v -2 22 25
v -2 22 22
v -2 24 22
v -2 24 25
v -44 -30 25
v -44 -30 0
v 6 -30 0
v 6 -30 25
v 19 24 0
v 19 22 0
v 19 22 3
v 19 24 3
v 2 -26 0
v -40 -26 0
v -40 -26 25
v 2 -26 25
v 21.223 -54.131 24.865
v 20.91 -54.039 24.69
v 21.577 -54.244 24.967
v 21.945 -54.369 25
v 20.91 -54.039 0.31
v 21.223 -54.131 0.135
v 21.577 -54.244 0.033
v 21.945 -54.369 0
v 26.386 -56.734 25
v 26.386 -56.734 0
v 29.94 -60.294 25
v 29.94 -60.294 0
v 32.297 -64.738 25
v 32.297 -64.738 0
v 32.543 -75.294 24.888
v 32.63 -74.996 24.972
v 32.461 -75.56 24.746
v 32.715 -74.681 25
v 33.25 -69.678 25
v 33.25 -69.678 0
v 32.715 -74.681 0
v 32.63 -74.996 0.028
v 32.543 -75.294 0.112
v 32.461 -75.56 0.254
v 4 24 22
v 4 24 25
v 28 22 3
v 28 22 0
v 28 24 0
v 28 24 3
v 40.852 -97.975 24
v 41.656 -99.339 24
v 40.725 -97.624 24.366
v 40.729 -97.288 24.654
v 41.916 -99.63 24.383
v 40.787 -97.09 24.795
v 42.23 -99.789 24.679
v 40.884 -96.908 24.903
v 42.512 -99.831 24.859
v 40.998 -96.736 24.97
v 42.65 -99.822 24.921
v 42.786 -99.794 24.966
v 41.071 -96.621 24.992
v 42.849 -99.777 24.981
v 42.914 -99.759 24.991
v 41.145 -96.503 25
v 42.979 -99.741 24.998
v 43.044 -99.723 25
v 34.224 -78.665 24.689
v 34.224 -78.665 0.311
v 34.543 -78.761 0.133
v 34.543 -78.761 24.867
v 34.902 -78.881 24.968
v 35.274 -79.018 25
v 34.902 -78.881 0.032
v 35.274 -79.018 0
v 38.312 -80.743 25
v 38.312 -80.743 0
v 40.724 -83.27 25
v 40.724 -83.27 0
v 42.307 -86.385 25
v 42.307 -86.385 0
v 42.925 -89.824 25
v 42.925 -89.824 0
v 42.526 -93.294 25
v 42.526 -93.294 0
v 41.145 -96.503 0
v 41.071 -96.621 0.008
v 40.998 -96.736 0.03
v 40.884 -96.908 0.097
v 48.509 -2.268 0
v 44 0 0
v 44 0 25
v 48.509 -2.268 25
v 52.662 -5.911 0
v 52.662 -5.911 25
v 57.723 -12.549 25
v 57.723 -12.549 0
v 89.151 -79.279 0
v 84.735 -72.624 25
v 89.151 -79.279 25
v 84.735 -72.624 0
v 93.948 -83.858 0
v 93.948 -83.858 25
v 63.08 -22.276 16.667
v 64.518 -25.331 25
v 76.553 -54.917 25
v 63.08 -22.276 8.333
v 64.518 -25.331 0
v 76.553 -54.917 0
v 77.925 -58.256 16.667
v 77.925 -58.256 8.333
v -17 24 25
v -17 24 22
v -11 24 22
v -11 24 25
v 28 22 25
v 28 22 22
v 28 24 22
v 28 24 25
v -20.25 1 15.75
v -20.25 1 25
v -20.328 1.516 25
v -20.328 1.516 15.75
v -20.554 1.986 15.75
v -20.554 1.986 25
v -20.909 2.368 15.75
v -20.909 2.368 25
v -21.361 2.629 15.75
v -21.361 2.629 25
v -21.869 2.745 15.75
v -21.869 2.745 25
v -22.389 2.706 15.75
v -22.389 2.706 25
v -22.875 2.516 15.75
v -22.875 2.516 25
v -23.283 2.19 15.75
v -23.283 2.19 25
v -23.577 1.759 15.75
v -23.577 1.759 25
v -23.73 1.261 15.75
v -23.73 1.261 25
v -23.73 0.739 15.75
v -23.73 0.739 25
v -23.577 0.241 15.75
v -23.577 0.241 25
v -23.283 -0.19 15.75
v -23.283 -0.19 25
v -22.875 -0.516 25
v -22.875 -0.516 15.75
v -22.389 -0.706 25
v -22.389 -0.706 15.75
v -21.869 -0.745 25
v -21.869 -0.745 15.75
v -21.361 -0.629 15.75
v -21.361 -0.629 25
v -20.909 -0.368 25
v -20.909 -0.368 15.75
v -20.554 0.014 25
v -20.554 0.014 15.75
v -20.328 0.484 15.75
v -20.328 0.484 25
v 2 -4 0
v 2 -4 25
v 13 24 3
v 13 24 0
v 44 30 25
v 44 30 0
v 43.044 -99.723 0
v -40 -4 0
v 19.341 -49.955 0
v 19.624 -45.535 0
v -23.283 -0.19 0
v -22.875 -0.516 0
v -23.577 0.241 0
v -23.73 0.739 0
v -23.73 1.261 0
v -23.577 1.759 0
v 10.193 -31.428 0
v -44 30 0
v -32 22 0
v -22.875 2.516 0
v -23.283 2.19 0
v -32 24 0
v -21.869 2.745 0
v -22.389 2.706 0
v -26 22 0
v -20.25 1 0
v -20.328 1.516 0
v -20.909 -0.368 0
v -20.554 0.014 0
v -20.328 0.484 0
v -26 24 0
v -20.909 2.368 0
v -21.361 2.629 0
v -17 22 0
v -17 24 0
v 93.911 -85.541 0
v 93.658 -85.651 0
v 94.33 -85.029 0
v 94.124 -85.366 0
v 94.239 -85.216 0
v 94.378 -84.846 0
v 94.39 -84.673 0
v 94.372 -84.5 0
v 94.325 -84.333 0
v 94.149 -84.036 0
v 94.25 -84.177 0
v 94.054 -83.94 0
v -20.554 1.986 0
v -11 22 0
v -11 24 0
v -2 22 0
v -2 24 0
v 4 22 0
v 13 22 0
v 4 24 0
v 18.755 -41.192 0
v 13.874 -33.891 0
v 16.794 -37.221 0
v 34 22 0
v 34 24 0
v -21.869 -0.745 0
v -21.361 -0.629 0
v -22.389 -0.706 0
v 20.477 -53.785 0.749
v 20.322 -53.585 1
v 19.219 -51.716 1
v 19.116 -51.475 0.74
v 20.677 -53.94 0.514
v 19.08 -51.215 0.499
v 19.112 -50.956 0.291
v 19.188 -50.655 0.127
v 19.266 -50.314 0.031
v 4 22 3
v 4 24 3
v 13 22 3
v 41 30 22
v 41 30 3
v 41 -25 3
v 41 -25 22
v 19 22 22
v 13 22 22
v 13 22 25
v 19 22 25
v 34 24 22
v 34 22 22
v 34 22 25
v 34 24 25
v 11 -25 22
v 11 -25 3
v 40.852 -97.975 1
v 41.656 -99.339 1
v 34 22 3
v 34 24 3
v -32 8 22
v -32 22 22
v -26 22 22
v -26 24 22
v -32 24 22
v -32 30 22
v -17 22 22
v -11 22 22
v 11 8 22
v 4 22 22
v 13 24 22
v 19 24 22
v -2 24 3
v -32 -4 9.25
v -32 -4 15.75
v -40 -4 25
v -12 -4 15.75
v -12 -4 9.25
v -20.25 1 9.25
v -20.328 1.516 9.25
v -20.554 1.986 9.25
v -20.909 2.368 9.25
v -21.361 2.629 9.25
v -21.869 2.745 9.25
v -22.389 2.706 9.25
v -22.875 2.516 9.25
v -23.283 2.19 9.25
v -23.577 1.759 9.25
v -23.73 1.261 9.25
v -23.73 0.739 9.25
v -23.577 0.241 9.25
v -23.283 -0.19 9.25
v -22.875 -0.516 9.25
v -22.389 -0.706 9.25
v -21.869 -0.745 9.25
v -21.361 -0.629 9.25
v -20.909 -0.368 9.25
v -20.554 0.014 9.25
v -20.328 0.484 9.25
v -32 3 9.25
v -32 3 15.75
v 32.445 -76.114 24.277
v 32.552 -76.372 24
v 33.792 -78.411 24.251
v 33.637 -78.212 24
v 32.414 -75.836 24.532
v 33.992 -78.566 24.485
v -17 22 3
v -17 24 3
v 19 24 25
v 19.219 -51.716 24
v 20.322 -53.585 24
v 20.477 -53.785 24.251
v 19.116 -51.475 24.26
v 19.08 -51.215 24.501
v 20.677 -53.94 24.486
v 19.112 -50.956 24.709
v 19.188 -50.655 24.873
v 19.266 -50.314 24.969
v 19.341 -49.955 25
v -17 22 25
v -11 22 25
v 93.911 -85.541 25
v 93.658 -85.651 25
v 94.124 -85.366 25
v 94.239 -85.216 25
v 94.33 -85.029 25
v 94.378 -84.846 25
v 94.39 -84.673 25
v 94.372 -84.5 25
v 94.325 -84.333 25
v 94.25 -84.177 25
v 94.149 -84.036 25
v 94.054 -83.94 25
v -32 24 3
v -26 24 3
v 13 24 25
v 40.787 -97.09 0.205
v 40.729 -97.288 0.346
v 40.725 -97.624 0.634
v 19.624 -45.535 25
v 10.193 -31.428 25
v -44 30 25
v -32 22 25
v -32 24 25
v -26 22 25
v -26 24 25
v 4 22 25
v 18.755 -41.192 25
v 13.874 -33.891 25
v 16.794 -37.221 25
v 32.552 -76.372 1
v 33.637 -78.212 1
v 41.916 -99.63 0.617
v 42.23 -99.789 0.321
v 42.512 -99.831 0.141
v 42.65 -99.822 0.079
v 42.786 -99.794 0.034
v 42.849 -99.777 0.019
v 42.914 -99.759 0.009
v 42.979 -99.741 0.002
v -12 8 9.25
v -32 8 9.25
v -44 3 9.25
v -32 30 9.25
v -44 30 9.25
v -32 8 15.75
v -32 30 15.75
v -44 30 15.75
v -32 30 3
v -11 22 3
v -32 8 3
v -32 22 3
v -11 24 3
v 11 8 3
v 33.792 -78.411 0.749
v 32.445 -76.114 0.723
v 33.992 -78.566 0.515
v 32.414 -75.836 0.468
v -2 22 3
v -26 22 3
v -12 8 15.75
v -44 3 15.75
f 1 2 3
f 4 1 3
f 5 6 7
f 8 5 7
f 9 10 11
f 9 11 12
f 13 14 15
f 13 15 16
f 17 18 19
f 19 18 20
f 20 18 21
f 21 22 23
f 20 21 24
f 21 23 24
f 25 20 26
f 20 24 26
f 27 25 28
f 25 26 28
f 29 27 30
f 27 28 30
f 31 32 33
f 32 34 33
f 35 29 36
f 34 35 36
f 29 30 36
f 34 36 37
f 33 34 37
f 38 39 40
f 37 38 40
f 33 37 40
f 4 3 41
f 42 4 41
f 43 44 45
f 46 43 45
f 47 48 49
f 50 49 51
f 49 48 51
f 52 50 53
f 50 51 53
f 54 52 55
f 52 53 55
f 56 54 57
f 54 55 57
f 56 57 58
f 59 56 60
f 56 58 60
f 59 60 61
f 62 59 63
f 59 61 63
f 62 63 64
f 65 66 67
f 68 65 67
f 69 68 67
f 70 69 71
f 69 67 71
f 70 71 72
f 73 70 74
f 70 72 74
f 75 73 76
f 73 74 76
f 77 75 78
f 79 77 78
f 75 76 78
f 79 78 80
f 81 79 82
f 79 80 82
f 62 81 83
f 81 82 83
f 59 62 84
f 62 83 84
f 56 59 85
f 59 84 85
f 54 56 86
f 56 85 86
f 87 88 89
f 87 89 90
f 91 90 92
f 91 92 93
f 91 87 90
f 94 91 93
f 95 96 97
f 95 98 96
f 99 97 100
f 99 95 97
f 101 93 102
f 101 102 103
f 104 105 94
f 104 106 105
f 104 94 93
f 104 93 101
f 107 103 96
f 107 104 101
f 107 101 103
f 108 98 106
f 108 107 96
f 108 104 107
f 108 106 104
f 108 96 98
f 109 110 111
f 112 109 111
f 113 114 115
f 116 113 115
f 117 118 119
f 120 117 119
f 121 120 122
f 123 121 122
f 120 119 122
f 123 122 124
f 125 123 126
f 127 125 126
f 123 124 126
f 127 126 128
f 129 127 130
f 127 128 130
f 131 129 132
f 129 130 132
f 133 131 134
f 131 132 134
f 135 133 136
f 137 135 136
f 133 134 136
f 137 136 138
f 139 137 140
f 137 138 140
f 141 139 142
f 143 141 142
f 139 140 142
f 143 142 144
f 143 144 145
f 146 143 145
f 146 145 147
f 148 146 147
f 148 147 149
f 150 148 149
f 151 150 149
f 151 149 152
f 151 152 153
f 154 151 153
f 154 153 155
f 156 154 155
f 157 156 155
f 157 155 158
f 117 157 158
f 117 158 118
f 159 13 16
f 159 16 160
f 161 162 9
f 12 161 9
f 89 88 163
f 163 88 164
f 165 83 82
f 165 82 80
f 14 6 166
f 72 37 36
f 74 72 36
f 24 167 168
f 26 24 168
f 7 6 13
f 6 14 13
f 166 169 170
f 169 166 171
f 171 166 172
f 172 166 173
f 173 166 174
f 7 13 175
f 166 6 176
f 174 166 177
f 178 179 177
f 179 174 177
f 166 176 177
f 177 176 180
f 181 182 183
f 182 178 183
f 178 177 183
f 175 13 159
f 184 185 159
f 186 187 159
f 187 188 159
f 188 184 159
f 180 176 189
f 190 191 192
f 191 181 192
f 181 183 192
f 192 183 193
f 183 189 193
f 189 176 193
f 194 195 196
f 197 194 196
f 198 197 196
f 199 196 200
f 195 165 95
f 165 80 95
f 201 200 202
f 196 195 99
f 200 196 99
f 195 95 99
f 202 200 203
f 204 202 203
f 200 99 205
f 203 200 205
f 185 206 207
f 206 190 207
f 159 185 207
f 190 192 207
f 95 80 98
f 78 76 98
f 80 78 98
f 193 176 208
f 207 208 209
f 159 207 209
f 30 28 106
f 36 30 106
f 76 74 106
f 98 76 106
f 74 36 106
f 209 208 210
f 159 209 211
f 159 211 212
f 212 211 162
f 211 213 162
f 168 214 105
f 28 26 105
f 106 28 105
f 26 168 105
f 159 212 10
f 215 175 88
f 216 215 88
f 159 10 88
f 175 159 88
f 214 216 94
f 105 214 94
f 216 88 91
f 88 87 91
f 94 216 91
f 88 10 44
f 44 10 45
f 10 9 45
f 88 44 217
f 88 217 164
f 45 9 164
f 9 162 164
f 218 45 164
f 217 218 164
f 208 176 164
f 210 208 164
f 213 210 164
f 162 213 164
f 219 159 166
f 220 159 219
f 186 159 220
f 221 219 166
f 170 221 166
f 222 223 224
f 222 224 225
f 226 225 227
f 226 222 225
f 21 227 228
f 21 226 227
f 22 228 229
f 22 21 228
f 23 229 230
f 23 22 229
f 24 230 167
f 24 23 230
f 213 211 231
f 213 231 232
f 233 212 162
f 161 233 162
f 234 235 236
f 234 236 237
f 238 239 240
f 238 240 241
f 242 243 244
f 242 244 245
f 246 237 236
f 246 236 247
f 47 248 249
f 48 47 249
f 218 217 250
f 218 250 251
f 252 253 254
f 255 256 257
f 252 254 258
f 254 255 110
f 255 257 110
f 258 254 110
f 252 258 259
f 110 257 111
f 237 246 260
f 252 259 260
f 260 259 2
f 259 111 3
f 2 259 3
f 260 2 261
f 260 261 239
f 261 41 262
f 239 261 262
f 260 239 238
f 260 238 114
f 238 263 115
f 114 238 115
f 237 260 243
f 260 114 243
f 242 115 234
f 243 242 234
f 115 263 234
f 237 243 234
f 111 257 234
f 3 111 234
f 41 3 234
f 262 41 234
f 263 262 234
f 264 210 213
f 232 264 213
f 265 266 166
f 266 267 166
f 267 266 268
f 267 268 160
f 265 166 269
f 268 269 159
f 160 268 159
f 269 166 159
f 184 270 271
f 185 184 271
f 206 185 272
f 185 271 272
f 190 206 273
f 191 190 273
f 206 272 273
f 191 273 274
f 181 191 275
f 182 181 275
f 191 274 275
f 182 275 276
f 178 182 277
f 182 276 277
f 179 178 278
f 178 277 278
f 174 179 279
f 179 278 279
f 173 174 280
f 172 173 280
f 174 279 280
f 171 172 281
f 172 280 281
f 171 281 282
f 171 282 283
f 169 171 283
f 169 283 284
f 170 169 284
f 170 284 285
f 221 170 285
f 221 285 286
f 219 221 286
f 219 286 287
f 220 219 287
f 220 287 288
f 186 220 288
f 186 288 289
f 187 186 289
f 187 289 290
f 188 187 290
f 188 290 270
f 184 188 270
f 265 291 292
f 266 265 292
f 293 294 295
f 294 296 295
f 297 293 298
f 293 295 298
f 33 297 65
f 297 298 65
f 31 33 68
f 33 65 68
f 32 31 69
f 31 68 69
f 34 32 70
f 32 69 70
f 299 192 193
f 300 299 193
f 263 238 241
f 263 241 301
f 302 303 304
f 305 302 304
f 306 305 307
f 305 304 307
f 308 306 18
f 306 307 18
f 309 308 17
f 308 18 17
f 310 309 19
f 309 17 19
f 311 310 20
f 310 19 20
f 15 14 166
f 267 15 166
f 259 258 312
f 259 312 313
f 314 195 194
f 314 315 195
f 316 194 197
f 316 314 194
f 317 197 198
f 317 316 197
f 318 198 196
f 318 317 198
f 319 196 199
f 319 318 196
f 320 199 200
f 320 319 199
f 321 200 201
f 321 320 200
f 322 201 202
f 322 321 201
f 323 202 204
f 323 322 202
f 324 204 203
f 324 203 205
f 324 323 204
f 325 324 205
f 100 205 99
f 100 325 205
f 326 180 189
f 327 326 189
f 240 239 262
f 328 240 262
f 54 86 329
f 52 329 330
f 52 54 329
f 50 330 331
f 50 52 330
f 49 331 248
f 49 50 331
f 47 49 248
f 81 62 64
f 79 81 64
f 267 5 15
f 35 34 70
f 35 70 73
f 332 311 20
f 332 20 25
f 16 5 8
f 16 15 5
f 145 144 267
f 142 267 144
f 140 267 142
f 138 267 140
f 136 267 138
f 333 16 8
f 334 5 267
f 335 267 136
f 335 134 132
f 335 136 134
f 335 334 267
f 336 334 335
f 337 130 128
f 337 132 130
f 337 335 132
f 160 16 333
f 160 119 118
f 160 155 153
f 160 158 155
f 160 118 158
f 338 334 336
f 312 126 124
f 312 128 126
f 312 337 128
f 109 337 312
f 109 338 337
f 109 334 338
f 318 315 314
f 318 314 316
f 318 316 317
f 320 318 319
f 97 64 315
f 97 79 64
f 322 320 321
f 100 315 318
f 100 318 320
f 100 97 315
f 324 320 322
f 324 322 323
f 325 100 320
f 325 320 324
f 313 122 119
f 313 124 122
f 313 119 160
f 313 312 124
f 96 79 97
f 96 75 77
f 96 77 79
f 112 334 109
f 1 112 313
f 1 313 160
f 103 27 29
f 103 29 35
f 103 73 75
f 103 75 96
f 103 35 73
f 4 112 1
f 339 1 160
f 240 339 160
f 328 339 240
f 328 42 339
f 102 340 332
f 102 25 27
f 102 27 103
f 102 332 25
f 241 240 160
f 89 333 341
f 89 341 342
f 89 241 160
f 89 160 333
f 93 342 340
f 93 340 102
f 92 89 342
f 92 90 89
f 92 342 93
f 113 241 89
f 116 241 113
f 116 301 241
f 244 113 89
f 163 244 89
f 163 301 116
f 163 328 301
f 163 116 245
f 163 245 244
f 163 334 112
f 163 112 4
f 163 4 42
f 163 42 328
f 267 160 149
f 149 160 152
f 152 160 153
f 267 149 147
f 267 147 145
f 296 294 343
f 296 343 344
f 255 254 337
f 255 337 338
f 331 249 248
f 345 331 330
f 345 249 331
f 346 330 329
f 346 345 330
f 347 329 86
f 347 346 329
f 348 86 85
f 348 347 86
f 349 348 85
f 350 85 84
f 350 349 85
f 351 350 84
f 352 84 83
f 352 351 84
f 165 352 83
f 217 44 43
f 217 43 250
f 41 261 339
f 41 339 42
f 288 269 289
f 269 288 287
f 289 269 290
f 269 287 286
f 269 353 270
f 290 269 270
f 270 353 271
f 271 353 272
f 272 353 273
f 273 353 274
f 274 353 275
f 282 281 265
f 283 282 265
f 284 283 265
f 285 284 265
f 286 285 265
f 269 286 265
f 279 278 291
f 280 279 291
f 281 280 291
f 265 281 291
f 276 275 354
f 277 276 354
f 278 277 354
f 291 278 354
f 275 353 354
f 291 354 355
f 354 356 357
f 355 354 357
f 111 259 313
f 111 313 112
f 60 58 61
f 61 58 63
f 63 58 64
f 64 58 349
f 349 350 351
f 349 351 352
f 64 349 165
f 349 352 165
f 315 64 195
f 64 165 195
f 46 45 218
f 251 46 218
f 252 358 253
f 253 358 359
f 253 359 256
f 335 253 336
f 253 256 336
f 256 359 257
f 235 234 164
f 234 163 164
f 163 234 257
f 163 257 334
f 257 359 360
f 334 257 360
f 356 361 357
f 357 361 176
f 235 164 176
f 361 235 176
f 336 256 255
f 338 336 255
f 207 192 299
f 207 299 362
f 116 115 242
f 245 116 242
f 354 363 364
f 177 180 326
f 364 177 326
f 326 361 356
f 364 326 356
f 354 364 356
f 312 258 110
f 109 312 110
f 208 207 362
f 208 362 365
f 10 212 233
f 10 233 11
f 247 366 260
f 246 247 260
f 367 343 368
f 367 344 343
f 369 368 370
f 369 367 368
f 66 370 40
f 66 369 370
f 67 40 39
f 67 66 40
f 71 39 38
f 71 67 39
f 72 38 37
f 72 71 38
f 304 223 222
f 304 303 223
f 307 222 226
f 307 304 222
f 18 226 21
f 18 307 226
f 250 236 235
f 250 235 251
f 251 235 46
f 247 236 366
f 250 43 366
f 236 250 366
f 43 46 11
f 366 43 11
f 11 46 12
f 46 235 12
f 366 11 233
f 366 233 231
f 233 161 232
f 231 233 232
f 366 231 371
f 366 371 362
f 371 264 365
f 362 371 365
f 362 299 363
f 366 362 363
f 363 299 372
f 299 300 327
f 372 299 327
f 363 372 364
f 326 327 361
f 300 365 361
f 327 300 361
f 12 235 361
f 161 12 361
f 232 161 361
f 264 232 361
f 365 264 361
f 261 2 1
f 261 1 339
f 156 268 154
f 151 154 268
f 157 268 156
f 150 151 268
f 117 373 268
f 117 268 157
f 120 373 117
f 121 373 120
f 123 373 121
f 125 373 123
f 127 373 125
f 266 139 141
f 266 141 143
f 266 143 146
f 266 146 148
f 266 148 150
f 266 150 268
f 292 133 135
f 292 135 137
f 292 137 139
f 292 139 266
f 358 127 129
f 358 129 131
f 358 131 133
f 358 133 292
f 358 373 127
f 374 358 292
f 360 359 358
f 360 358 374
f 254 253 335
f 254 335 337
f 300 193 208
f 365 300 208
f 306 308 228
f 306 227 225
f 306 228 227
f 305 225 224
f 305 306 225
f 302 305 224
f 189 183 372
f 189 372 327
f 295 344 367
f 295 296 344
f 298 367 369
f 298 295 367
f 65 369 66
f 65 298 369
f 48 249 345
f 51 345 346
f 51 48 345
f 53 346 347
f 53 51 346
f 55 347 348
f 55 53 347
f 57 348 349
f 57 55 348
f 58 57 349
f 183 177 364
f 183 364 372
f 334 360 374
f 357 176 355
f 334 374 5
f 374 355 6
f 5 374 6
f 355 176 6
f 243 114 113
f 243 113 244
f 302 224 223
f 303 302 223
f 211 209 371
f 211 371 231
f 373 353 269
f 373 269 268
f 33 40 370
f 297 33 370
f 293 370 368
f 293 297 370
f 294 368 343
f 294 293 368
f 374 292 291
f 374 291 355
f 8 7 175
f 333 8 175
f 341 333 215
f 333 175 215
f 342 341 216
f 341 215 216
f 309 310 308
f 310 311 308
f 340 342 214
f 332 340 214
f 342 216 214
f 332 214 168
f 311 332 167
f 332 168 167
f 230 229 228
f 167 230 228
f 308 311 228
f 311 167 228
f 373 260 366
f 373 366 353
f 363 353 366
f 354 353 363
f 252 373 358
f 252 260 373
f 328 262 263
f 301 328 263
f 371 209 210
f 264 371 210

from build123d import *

# Parameters (mm, degrees)
F0_W     = 42
F0_H     = 22
F0_W_2   = 6
F0_H_2   = 2
F1_DEPTH = 25
F2_W     = 30
F2_H     = 19
F2_W_2   = 20
F2_H_2   = 6.5
F2_W_3   = 12
F3_DEPTH = 22
F4_DEPTH = 55
F5_DEPTH = 34
F6_DEPTH = 27
F7_R     = 1
F8_R     = 1.75
F9_DEPTH = 25.0010001


with BuildPart() as f1:
    # F0 (on Top) → F1 (new body)
    with BuildSketch(Plane.XY):
        Polygon((44, 30), (-44, 30), (-44, -30), (6, -30), (44, -30), (44, 0), align=None)
        with Locations((-19, -15)):
            Rectangle(F0_W, F0_H, mode=Mode.SUBTRACT)
        with Locations((-29, 23)):
            Rectangle(F0_W_2, F0_H_2, mode=Mode.SUBTRACT)
        with Locations((-14, 23)):
            Rectangle(F0_W_2, F0_H_2, mode=Mode.SUBTRACT)
        with Locations((1, 23)):
            Rectangle(F0_W_2, F0_H_2, mode=Mode.SUBTRACT)
        with Locations((16, 23)):
            Rectangle(F0_W_2, F0_H_2, mode=Mode.SUBTRACT)
        with Locations((31, 23)):
            Rectangle(F0_W_2, F0_H_2, mode=Mode.SUBTRACT)
        with BuildLine():
            add(Edge.make_bspline(
                [(44, 0), (67.8392201662, -7.6675033197), (76.1326849461, -76.210565865), (96, -85)],
                knots=[0, 0, 0, 0, 99.6443676281, 99.6443676281, 99.6443676281, 99.6443676281], degree=3))
            Line((44, 0), (44, -30))
            Line((44, -30), (6, -30))
            ThreePointArc((6, -30), (17.1808031069, -37.8263151446), (19.0039282867, -51.3517645433))
            Line((19.0039282867, -51.3517645433), (20.5282030185, -53.9356737024))
            ThreePointArc((20.5282030185, -53.9356737024), (31.2549165387, -62.3736345883), (32.3205438236, -75.9797363573))
            Line((32.3205438236, -75.9797363573), (33.8448185554, -78.5636455164))
            ThreePointArc((33.8448185554, -78.5636455164), (42.2422484339, -86.1981187462), (40.5220414274, -97.416090841))
            Line((40.5220414274, -97.416090841), (42.0463161591, -100))
            Line((42.0463161591, -100), (96, -85))
        make_face()
    extrude(amount=F1_DEPTH)

    # F2 (on face) → F3 (cut)
    with BuildSketch(Plane(origin=(0, 30, 0), x_dir=(-1, 0, 0), z_dir=(0, 1, 0))):
        Polygon((32, 22), (-11, 22), (-11, 3), (32, 3), (32, 9.25), (12, 9.25), (12, 15.75), (32, 15.75), align=None)
        with Locations((-26, 12.5)):
            Rectangle(F2_W, F2_H)
        with Locations((22, 12.5)):
            Rectangle(F2_W_2, F2_H_2)
        with Locations((38, 12.5)):
            Rectangle(F2_W_3, F2_H_2)
    extrude(amount=-F3_DEPTH, mode=Mode.SUBTRACT)

    # F2 (on face) → F4 (cut)
    with BuildSketch(Plane(origin=(0, 30, 0), x_dir=(-1, 0, 0), z_dir=(0, 1, 0))):
        with Locations((-26, 12.5)):
            Rectangle(F2_W, F2_H)
    extrude(amount=-F4_DEPTH, mode=Mode.SUBTRACT)

    # F2 (on face) → F5 (cut, through all)
    with BuildSketch(Plane(origin=(0, 30, 0), x_dir=(-1, 0, 0), z_dir=(0, 1, 0))):
        with Locations((22, 12.5)):
            Rectangle(F2_W_2, F2_H_2)
    extrude(amount=-F5_DEPTH, mode=Mode.SUBTRACT)

    # F2 (on face) → F6 (cut)
    with BuildSketch(Plane(origin=(0, 30, 0), x_dir=(-1, 0, 0), z_dir=(0, 1, 0))):
        with Locations((38, 12.5)):
            Rectangle(F2_W_3, F2_H_2)
    extrude(amount=-F6_DEPTH, mode=Mode.SUBTRACT)

    # F7
    f7_edges = [f1.edges().sort_by_distance(p)[0] for p in [
        (20.528203, -53.935674, 12.5),
        (19.003928, -51.351765, 12.5),
        (19.766066, -52.643719, 0),
        (19.766066, -52.643719, 25),
        (33.844819, -78.563646, 12.5),
        (32.320544, -75.979736, 12.5),
        (33.082681, -77.271691, 0),
        (33.082681, -77.271691, 25),
        (42.046316, -100, 12.5),
        (40.522041, -97.416091, 12.5),
        (41.284179, -98.708045, 0),
        (41.284179, -98.708045, 25),
        (96, -85, 12.5),
    ]]
    fillet(f7_edges, radius=F7_R)

    # F8 (on face) → F9 (cut, through all)
    with BuildSketch(Plane.XY.offset(25)):
        with Locations((-22, 1)):
            Circle(F8_R)
    extrude(amount=-F9_DEPTH, mode=Mode.SUBTRACT)


solid = f1.part
